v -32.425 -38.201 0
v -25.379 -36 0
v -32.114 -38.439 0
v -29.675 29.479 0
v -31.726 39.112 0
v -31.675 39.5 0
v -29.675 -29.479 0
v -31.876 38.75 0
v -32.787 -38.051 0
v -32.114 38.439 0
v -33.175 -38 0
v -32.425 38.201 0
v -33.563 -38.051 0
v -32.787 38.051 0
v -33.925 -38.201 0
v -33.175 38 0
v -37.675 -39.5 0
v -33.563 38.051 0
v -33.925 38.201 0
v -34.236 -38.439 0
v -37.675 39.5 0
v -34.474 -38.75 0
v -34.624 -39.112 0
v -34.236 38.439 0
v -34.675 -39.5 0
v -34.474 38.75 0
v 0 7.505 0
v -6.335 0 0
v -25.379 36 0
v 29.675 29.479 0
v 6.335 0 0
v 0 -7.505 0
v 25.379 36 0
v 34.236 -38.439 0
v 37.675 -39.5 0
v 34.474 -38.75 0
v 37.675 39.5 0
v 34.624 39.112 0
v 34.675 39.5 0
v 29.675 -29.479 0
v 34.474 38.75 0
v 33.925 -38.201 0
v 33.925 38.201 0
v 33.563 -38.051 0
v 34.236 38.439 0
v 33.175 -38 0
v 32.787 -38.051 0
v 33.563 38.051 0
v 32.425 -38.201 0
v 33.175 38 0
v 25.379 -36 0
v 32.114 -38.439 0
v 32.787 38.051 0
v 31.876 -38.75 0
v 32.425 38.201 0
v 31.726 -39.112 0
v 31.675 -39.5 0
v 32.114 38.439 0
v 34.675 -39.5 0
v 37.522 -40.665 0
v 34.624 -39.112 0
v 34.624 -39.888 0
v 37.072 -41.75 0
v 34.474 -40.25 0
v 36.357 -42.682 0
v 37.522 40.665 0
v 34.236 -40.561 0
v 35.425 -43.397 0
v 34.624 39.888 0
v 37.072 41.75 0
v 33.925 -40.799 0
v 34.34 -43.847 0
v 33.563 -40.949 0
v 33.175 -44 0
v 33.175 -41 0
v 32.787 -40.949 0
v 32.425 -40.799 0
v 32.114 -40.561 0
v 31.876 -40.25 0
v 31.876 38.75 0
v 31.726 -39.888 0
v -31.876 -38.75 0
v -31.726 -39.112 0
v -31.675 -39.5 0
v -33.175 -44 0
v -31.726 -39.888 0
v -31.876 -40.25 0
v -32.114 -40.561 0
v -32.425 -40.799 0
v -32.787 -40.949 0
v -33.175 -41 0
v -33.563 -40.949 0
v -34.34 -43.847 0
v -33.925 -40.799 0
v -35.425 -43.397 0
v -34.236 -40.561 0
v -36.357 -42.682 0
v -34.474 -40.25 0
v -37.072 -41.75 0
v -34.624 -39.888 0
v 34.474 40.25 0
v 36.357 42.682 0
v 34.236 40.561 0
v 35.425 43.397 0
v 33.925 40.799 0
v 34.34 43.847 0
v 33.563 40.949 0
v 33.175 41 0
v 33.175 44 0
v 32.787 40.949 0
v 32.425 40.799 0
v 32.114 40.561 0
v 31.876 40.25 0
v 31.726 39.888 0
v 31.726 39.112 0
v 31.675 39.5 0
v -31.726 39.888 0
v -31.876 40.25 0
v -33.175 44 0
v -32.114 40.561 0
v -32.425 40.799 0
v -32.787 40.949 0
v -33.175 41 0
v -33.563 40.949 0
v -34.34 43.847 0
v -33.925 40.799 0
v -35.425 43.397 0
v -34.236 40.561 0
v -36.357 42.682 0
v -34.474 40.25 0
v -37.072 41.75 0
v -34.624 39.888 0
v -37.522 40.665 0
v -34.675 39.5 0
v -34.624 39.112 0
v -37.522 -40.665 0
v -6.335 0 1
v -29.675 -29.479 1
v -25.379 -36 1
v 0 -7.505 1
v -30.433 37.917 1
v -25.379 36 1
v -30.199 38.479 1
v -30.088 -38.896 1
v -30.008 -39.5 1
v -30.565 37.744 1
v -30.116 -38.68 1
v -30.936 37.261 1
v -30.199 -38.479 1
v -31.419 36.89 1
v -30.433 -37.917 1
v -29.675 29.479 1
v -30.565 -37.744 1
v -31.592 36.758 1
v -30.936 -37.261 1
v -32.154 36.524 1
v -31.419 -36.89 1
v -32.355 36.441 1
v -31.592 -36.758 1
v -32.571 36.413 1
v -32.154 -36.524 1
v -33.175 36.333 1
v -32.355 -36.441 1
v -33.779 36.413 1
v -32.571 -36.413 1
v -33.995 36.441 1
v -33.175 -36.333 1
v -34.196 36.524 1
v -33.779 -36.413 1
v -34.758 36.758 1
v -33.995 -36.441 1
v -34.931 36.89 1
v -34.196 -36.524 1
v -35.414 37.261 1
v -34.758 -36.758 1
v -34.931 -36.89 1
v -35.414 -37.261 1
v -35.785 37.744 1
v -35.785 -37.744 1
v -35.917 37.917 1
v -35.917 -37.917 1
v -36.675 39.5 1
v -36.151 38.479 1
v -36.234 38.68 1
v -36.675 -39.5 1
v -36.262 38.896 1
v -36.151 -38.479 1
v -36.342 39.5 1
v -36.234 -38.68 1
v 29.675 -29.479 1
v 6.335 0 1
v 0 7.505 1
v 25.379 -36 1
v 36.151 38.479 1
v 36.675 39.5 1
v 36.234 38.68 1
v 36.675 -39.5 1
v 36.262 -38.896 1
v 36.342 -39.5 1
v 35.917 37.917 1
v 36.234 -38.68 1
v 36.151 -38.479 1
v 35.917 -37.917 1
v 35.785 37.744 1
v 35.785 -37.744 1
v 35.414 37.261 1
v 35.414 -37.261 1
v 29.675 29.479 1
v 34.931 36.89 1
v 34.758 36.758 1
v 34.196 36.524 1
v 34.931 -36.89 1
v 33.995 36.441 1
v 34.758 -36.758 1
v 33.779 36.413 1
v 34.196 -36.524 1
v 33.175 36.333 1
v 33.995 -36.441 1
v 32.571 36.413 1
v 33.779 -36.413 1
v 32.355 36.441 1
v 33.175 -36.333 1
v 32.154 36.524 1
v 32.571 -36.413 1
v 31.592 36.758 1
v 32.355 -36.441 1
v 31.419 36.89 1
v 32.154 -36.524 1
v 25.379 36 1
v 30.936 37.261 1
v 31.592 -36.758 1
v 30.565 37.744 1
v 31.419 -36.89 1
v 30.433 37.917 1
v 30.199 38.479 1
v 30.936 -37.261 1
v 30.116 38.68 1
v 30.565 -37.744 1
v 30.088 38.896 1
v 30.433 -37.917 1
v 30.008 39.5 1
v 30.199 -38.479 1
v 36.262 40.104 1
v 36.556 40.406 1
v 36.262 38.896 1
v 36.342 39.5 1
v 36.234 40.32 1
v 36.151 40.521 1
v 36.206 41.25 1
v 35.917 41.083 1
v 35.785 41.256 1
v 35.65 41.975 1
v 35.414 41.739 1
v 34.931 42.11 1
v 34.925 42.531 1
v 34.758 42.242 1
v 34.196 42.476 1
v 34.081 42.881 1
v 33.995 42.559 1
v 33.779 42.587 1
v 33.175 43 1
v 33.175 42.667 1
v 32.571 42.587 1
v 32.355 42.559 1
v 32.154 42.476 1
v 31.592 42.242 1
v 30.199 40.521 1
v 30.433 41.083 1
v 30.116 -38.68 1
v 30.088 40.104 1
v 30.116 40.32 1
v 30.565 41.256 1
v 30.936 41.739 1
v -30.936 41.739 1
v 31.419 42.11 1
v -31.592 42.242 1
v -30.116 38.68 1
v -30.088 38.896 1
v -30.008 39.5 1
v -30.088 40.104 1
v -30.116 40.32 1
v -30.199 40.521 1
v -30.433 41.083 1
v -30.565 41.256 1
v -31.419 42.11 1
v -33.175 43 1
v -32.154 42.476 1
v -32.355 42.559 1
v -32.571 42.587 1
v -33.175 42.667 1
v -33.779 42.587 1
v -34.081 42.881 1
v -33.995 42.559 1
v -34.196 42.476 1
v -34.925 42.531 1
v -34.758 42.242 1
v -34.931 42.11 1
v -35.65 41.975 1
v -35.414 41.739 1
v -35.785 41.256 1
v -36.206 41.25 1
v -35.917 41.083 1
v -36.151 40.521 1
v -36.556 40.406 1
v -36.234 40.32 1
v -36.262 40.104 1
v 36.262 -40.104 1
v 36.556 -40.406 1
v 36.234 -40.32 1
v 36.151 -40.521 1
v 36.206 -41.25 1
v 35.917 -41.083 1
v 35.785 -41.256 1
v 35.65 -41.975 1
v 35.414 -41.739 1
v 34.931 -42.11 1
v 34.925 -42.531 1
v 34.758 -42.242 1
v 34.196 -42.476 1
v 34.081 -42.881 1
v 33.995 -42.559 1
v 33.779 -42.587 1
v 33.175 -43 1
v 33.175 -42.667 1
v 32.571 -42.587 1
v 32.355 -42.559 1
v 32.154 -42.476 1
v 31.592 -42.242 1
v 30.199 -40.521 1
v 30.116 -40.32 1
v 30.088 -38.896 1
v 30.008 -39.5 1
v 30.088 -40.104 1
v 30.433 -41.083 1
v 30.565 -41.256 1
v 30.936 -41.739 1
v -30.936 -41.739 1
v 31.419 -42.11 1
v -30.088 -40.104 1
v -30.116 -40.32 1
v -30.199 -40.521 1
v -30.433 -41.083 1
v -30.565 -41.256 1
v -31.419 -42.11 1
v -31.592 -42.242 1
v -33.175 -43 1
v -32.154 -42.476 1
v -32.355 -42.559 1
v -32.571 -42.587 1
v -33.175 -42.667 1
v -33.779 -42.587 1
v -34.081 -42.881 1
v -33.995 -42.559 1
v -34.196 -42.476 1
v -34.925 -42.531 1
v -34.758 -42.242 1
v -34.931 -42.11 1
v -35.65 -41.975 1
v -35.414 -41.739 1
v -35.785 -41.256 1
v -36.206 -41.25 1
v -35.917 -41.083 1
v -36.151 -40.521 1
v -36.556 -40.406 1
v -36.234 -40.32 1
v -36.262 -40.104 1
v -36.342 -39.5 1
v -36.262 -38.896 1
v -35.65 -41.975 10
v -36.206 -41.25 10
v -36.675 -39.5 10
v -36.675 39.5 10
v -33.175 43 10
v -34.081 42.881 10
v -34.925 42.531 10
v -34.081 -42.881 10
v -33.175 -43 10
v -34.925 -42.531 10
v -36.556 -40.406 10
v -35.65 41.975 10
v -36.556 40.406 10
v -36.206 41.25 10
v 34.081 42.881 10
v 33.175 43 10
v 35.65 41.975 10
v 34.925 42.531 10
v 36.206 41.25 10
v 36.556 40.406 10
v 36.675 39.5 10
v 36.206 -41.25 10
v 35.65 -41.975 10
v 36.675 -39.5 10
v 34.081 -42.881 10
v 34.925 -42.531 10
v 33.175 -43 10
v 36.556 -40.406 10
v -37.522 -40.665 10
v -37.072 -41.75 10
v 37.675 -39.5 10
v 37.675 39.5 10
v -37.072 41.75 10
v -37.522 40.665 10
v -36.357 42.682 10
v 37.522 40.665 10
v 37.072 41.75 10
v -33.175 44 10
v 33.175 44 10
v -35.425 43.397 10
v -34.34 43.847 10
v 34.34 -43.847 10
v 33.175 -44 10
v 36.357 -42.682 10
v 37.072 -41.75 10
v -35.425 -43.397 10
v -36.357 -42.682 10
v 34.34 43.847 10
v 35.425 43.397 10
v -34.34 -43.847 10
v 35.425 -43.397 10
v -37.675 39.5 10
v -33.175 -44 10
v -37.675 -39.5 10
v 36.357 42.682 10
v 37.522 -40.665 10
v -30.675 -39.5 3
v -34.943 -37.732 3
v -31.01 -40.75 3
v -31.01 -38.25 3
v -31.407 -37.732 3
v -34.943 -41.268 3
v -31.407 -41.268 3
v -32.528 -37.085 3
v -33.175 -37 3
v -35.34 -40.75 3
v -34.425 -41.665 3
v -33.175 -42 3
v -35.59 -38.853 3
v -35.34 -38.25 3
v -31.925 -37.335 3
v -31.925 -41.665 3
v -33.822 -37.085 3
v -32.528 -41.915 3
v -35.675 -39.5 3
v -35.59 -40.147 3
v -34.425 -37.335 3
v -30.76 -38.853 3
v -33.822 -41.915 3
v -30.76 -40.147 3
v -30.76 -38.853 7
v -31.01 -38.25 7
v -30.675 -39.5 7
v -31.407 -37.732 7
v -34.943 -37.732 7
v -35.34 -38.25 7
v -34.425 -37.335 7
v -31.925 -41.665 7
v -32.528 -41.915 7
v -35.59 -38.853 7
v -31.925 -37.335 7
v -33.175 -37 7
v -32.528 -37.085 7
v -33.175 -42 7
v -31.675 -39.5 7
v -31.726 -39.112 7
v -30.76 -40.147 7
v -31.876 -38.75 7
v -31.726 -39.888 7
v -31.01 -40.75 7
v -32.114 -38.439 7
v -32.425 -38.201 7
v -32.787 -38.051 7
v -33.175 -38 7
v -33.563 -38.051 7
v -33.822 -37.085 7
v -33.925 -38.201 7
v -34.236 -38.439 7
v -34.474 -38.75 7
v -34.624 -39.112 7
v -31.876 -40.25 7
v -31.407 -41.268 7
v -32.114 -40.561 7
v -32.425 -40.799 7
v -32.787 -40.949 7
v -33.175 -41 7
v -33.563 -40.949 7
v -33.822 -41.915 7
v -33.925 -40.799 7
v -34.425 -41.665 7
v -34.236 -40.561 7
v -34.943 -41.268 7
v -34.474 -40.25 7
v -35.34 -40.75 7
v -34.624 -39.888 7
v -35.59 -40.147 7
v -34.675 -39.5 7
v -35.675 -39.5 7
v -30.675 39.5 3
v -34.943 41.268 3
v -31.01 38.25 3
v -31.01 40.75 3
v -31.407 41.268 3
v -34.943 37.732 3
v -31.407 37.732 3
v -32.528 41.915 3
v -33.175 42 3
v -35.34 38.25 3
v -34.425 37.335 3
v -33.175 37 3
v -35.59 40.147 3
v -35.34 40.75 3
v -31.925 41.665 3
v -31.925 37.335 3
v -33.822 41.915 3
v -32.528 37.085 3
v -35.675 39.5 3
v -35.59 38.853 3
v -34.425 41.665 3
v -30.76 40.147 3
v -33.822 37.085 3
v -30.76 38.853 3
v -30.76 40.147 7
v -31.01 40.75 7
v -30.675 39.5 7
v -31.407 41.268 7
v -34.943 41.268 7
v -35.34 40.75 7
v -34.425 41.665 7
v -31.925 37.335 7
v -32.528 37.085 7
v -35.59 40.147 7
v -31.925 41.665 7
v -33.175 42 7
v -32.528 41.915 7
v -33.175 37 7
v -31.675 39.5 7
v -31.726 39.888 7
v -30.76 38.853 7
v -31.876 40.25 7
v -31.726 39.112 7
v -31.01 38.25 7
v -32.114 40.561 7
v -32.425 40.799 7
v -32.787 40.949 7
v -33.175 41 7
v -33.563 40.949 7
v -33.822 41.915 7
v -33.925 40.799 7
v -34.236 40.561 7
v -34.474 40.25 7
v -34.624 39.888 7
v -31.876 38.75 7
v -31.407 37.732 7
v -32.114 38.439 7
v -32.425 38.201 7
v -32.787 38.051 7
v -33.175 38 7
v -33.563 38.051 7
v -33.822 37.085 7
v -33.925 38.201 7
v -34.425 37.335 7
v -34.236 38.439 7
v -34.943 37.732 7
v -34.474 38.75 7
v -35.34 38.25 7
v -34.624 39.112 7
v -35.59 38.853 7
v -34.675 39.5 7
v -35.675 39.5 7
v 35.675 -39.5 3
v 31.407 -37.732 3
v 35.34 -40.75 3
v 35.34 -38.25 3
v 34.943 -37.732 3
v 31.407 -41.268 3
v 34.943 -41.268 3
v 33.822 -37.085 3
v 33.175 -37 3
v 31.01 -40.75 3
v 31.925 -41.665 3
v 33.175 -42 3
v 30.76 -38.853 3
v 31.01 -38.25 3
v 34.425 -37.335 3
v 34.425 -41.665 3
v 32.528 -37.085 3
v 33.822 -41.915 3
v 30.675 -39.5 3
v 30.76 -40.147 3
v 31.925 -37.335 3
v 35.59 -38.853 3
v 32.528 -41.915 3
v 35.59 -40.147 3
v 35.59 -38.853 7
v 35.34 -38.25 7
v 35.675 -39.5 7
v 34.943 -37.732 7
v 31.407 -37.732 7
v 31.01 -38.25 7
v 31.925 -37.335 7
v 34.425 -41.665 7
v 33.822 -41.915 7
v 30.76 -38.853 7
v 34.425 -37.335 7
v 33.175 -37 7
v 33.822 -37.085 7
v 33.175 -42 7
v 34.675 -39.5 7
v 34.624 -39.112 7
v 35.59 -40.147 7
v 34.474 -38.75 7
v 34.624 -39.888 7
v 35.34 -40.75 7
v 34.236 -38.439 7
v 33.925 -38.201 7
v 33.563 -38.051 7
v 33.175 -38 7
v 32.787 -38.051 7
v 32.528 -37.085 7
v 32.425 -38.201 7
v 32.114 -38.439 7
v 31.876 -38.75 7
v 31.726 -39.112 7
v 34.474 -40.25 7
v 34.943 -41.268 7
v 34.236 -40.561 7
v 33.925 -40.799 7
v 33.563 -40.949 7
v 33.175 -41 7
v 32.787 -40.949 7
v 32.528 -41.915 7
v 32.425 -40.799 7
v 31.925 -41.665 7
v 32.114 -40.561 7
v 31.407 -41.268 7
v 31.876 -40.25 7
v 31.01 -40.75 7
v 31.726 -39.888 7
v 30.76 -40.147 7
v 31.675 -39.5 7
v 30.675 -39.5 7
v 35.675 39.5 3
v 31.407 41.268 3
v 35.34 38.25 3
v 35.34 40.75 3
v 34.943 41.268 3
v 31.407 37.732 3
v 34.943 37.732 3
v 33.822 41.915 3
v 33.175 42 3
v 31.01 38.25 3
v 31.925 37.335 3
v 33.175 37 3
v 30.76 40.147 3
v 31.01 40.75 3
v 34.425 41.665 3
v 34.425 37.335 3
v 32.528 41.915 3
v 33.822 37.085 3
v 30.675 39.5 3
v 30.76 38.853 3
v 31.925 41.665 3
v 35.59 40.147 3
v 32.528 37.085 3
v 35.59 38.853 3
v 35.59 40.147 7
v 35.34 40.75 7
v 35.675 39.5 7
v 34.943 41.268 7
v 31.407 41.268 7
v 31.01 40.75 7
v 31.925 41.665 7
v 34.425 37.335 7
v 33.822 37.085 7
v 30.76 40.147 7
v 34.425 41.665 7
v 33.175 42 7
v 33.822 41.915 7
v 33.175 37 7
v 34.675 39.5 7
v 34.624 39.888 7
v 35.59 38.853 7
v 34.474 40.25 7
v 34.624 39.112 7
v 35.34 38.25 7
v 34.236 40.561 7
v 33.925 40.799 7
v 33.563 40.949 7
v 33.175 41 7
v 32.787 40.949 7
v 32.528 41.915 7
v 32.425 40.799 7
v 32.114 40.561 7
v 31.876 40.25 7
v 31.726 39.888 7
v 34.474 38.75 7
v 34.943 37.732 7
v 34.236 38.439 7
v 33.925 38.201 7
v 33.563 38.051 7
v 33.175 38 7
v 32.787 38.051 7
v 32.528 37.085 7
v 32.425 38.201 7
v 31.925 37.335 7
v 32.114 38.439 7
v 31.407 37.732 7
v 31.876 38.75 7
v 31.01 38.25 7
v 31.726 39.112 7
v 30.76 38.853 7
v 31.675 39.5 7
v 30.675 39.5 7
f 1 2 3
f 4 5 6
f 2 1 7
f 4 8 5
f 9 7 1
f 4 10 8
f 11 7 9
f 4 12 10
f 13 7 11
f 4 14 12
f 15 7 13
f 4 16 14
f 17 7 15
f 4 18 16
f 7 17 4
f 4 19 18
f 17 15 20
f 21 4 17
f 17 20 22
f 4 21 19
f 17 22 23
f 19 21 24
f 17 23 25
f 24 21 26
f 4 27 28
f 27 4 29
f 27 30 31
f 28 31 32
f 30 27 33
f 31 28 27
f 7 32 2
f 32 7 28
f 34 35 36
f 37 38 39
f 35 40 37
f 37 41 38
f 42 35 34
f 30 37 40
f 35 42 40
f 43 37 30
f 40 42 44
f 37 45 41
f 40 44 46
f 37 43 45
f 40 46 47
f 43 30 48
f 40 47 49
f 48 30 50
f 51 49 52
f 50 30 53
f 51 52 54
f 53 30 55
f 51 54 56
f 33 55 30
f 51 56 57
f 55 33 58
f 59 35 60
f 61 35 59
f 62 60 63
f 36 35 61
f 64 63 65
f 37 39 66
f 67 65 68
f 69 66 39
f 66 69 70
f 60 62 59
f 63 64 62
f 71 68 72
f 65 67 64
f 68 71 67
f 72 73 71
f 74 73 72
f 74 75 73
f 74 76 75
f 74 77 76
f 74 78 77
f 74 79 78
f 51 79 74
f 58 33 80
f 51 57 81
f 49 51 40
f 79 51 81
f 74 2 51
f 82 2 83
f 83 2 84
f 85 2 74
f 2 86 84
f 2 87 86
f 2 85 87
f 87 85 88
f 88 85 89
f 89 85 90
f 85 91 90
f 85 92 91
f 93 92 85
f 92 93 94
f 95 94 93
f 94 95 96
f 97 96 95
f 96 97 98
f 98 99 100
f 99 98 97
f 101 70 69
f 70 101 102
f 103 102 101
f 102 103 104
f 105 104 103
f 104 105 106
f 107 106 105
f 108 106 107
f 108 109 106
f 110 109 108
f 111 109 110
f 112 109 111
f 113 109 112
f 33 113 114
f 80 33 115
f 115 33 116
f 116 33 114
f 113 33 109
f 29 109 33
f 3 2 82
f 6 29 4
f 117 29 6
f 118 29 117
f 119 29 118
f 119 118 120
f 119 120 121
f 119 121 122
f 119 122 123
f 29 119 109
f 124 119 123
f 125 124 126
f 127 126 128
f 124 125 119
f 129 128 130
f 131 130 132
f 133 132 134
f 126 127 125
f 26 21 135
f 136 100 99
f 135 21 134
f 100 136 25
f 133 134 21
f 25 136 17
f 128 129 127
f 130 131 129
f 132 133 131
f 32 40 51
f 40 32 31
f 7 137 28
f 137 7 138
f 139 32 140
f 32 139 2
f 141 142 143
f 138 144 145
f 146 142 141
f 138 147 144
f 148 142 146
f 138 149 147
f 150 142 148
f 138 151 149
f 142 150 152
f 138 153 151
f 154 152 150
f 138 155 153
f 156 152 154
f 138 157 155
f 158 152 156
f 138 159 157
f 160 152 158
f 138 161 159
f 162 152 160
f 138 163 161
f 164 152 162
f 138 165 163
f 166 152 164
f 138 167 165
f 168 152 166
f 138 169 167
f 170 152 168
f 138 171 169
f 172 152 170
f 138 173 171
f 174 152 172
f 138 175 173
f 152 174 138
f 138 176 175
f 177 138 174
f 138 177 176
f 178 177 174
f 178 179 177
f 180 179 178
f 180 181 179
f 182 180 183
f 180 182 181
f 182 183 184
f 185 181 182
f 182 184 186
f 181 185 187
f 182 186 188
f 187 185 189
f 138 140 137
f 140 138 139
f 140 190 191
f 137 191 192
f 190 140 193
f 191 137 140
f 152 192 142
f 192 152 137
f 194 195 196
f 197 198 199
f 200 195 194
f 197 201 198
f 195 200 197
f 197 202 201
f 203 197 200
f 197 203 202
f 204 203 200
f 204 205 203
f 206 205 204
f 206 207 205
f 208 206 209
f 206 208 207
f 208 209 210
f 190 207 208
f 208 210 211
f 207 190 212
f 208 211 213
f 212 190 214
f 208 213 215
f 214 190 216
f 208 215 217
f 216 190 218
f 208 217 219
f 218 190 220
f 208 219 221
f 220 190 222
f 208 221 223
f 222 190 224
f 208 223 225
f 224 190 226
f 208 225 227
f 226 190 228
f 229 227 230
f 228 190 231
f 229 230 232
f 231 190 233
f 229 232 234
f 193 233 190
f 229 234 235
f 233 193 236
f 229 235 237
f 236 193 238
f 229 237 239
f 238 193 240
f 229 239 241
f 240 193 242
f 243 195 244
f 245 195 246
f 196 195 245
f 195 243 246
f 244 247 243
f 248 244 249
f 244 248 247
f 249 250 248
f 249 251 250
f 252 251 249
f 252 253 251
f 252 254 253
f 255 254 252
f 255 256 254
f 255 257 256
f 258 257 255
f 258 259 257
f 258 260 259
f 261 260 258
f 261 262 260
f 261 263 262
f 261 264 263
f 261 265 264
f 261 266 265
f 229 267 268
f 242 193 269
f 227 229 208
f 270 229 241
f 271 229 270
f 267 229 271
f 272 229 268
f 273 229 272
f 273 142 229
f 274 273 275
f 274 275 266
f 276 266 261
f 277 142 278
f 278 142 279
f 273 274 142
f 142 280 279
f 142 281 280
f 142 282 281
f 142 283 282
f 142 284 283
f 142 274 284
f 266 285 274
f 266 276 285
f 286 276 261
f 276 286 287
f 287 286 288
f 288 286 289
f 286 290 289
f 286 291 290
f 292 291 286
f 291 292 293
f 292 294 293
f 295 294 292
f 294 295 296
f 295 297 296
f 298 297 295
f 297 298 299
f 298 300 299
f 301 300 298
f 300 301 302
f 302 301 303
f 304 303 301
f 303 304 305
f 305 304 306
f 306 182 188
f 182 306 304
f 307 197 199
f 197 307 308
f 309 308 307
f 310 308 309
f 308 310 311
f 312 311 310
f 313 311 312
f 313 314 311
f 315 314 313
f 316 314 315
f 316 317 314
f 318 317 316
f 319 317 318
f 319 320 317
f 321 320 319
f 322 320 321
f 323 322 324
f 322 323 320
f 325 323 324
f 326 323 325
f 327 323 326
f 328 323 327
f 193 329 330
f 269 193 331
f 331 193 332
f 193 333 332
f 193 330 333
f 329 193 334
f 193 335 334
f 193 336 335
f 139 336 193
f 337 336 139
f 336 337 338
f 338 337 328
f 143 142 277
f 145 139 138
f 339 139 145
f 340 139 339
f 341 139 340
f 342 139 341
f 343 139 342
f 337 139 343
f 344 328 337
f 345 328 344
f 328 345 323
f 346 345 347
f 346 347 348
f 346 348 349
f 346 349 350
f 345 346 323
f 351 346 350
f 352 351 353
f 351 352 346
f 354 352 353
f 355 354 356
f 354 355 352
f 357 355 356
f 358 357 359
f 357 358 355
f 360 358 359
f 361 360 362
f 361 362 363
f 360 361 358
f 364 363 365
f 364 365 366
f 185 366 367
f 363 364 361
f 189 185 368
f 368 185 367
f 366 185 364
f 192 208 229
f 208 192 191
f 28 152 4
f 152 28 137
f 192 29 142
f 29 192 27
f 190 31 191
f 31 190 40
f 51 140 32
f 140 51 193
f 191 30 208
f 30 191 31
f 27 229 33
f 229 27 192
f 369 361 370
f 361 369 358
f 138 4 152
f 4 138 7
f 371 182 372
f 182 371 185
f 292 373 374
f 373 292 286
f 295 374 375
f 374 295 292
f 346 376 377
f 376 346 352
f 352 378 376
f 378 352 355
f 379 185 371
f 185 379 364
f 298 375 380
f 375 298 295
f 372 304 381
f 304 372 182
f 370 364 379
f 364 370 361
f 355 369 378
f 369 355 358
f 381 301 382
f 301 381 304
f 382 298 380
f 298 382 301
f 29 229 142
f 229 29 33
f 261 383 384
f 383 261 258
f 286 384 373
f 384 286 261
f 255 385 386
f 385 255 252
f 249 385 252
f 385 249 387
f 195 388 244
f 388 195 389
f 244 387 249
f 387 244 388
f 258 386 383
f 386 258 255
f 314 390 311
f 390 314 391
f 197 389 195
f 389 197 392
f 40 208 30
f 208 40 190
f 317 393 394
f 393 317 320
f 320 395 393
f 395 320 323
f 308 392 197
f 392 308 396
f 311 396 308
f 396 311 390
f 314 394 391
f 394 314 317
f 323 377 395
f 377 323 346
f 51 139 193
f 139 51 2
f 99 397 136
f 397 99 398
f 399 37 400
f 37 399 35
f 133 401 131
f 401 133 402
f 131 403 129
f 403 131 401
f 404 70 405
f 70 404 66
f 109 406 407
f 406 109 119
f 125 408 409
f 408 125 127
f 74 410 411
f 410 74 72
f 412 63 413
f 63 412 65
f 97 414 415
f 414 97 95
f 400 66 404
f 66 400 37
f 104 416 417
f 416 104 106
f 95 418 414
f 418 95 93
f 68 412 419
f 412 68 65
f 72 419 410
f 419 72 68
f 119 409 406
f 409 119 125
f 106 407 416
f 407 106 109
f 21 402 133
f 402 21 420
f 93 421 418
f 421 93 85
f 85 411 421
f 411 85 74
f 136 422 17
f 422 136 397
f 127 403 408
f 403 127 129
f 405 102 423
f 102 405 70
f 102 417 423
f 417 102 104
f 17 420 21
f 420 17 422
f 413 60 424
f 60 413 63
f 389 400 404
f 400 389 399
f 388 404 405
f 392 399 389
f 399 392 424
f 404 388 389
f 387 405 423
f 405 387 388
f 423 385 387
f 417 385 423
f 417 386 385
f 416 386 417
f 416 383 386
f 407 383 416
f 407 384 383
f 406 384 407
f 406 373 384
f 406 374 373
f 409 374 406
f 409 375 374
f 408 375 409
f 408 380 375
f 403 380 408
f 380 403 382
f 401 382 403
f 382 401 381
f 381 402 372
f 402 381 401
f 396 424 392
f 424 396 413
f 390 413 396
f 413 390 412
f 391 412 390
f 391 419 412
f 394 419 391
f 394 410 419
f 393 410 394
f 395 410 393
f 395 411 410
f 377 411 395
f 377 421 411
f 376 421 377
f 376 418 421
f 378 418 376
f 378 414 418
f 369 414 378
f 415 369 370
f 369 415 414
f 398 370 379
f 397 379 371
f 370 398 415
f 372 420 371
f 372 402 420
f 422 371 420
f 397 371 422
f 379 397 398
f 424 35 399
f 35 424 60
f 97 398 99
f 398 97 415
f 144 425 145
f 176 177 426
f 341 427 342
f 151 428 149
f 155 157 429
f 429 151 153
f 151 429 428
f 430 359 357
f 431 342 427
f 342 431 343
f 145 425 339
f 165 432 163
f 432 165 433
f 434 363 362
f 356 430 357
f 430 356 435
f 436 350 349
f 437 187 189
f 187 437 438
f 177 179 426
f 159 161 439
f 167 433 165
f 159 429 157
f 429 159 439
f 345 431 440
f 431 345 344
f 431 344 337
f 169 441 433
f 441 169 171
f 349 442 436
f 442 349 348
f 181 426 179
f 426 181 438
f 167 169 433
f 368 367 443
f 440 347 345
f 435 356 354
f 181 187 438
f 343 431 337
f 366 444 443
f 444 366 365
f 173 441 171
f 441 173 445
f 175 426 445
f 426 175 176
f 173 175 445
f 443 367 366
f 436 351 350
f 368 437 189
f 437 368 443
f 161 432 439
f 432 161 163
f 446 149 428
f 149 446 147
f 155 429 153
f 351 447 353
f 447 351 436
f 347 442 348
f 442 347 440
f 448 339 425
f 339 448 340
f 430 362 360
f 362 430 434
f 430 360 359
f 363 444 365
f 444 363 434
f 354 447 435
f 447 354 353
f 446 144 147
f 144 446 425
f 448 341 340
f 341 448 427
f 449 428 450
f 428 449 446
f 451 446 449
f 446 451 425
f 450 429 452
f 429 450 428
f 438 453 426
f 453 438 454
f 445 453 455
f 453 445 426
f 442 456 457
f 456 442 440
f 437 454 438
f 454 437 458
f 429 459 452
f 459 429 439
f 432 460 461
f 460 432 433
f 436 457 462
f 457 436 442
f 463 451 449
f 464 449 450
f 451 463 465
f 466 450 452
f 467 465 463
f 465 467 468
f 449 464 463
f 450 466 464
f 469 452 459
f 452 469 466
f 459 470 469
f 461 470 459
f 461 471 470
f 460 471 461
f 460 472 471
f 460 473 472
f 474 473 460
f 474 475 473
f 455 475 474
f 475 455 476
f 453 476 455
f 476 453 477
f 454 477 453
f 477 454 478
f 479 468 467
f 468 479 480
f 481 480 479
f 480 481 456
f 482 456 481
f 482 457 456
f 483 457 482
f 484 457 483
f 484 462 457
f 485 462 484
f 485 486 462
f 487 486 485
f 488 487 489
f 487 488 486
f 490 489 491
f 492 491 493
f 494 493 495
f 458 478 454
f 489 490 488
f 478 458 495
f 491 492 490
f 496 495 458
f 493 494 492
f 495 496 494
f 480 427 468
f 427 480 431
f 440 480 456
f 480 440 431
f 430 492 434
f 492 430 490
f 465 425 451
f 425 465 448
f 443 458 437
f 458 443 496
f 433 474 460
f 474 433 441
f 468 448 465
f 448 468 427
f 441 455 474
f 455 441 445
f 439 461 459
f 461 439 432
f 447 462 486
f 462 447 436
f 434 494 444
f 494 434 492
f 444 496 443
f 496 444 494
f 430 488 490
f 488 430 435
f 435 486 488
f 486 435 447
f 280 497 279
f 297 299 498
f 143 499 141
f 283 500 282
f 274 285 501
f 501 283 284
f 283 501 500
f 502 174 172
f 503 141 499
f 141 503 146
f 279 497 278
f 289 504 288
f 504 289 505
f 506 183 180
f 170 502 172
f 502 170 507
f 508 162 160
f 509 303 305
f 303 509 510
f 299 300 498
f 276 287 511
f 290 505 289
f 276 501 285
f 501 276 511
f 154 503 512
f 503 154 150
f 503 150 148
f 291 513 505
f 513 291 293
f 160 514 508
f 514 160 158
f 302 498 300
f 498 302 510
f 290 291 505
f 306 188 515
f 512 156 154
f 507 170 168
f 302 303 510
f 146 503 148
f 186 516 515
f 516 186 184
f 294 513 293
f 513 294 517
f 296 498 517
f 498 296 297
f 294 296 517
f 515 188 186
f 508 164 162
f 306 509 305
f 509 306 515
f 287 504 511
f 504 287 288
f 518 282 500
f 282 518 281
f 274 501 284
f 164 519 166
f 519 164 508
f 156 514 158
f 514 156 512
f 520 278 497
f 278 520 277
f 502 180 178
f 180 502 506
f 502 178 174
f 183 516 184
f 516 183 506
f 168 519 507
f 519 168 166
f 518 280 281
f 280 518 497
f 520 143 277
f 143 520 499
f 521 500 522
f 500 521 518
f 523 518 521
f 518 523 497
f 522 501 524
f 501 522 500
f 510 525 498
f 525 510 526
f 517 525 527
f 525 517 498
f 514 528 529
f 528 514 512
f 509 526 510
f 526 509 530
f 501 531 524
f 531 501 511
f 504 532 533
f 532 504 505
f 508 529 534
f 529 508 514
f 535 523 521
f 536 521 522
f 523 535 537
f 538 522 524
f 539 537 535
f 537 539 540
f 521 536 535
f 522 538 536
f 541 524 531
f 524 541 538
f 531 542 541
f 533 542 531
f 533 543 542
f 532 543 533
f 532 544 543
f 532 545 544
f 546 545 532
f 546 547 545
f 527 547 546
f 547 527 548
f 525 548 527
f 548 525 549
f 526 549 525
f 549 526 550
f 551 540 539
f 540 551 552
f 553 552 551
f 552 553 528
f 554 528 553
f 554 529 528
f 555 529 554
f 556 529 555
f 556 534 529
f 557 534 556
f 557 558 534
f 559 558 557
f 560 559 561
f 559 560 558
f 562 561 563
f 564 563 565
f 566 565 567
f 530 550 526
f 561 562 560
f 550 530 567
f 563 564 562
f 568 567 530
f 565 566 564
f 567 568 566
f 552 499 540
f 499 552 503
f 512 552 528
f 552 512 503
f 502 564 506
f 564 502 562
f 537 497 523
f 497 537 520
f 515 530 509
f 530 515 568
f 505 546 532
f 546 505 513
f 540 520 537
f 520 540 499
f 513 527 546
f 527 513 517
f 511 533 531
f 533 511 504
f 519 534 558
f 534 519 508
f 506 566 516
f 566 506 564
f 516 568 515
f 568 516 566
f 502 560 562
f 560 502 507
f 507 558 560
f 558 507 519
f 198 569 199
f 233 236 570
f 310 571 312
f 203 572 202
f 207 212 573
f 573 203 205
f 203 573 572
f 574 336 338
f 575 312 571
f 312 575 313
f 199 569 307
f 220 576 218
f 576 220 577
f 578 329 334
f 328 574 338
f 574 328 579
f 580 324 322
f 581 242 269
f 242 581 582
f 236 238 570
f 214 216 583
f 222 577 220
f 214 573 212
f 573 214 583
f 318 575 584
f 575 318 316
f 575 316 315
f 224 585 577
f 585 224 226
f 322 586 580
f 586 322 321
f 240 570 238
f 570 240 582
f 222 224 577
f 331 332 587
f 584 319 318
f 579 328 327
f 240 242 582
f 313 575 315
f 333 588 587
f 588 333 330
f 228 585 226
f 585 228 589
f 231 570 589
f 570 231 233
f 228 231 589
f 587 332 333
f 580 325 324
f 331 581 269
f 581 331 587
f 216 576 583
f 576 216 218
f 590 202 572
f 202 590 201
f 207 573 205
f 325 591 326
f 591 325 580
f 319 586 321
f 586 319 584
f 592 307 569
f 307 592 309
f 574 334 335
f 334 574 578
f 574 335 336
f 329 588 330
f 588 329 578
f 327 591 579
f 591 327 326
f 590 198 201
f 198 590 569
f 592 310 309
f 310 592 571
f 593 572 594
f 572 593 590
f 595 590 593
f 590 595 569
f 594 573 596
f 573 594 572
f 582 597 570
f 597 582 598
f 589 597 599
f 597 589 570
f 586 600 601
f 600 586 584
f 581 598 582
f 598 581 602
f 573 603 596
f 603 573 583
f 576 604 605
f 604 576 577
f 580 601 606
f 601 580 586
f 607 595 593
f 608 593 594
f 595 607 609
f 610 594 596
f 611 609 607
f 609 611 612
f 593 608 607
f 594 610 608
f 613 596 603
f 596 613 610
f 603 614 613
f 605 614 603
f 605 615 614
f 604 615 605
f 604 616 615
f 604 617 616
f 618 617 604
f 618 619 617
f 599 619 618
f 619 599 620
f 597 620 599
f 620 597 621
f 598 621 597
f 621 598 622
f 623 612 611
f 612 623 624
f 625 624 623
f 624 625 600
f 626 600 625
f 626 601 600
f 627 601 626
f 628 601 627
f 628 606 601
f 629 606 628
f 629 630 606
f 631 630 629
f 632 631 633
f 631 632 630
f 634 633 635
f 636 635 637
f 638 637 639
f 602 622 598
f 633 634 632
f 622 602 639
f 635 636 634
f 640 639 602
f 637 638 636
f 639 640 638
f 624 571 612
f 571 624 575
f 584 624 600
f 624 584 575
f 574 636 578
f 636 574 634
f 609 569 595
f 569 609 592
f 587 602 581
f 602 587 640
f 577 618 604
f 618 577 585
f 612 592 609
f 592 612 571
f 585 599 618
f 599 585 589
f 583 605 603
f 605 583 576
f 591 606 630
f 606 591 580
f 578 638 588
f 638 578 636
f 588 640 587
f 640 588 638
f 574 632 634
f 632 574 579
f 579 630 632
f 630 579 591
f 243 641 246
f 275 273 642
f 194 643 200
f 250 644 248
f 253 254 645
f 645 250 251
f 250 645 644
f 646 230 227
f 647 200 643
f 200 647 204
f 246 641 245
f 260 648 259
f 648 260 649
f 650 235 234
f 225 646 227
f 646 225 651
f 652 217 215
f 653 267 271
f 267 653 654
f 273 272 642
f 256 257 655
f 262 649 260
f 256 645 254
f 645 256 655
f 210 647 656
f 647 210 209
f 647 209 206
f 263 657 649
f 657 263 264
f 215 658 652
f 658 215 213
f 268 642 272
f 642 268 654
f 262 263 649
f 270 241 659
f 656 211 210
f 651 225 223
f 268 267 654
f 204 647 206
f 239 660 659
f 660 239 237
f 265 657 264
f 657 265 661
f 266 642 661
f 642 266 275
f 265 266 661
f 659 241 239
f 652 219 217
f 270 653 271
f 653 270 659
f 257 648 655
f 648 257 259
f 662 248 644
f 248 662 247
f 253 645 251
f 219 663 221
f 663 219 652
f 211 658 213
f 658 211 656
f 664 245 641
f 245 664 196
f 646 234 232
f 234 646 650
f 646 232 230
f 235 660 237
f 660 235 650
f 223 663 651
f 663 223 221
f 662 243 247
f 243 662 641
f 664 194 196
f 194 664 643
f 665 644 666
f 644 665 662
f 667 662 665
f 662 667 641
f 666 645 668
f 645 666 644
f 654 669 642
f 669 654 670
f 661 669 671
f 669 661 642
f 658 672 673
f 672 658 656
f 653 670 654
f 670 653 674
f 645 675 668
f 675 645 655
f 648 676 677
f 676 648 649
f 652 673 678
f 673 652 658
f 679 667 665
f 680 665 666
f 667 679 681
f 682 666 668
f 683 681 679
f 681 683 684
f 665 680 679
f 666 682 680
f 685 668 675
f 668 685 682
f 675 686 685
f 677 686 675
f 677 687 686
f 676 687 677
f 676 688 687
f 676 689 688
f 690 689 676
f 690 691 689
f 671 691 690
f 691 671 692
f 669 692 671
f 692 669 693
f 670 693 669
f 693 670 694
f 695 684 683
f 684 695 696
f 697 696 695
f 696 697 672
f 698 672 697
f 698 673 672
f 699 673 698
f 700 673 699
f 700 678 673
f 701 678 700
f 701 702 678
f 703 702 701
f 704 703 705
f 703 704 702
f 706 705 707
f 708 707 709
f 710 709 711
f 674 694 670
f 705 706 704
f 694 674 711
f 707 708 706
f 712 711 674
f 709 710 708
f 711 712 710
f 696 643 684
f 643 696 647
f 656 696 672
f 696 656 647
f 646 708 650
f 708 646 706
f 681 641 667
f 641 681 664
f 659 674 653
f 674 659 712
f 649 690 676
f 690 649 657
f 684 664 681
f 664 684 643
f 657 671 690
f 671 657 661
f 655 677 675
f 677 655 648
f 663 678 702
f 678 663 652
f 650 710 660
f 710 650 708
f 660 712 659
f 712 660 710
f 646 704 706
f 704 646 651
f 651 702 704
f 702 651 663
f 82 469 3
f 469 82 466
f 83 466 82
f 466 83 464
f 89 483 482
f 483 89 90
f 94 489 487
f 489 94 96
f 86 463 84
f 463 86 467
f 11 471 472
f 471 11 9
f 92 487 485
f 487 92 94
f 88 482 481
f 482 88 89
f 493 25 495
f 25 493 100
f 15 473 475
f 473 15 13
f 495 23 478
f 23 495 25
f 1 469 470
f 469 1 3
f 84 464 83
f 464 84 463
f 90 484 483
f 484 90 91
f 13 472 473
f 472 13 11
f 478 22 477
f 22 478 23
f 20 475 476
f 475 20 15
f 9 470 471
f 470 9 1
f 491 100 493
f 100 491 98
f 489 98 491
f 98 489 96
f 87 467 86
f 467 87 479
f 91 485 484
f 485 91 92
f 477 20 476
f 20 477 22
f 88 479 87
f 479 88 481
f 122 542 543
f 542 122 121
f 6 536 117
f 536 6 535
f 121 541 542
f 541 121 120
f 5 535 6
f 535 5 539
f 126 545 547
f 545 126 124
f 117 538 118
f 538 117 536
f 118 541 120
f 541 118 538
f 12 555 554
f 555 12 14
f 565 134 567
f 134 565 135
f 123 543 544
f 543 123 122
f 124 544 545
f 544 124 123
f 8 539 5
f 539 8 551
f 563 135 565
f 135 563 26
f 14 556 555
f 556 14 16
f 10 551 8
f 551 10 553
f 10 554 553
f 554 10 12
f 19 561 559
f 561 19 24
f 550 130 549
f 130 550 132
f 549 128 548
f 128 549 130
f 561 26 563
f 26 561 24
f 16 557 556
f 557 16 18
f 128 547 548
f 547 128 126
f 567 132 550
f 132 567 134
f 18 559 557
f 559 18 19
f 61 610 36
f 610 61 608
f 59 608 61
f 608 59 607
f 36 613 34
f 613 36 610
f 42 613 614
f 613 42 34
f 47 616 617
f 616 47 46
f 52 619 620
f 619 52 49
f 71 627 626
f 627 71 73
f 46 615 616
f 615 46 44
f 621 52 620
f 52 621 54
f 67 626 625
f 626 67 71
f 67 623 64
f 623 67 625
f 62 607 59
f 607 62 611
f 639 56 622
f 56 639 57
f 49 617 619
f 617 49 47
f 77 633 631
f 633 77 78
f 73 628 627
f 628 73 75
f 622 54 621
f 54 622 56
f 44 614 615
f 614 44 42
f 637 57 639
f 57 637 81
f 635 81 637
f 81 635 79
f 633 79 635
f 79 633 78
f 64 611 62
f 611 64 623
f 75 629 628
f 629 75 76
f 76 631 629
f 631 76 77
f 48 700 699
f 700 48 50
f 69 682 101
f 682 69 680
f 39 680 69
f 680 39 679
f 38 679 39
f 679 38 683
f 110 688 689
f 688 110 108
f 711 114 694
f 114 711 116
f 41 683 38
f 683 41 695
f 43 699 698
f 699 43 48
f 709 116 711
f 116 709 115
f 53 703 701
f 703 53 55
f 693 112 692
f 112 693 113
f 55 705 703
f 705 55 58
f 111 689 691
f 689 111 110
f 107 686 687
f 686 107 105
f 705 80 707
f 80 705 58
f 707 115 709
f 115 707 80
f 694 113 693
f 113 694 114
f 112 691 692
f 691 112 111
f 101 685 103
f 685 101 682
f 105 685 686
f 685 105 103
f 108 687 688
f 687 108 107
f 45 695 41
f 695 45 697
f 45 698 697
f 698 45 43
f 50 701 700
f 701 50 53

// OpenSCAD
// file: hull.scad
module multiHull(){
	for (i = [1 : $children-1])
		hull(){
			children(0);
			children(i);
		}
}

module sequentialHull(){
	for (i = [0: $children-2])
		hull(){
			children(i);
			children(i+1);
		}
}

/* Extended fun hull functions */ 

module cylinders(points, diameter, thickness){
	for (p=points){
		translate(p) cylinder(d=diameter, h=thickness, center=true);
	}
}

module plate(points, diameter, thickness, hole_diameter){
	difference(){
		hull() cylinders(points, diameter, thickness);
		cylinders(points, hole_diameter, 1000);
	}
}

module bar(length, width, thickness, hole_diameter){
	plate([[0,0,0], [length,0,0]], width, thickness, hole_diameter);
}

module rounded_box(points, radius, height){
	hull(){
		for (p = points){
			translate(p)
				cylinder(r=radius, h=height);
		}
	}
}

module point_cloud(points, radius=1, facets=8){
	for (p=points){
		translate(p)
			sphere(radius/cos(180/facets), $fn=facets);
		// polygon sphere circumscribed on radius
	}
}

module point_hull(points, radius=1, facets=8){
	hull(){
		point_cloud(points, radius, facets);
	}
}

// Shrink the exterior of the points so that the hull fits inside
function select(vector, i) = [ for (p=vector) p[i] ];
function axis_center(v, i) = (max(select(v, i)) - min(select(v,i)))/2;
function center(v) = [ for (i = [0,1,2]) axis_center(v, i) ];
function shrink_point(point, center, radius) = [ for (i = [0,1,2]) point[i] > center[i] ? point[i] - radius : point[i] + radius ]; 
function shrink(points, radius) = [ for (p = points) shrink_point(p, center(points), radius) ];

module interior_point_hull(points, radius=1){
	point_hull(shrink(points, radius), radius);
}

module interior_rounded_box(points, radius, height){
	rounded_box(shrink(points, radius), radius, height);
}


module mirror_copy(v = [1, 0, 0]) {
    children();
    mirror(v) children();
}
// main file
use <hull.scad>

w = 66.35;
l = 79;
pin_locations = [ [-w/2, -l/2, 0], [-w/2, l/2, 0], 
							    [ w/2, -l/2, 0], [ w/2, l/2, 0] ];

thickness = 1;
$fn = 24;

module place(i){
	translate(pin_locations[i])
		children(0);
}

module foot(){
	cylinder(d=7, h=thickness);
}

module standoff(){
	cylinder(d1=7, d2=5, h=3);
	cylinder(d=5, h=7);
}

module cross_bottom(){
	multiHull(){
		cylinder(d=10, h=thickness);
		place(0) foot();
		place(1) foot();
		place(2) foot();
		place(3) foot();
	}
}

module ring_bottom(){
	sequentialHull(){
		place(0) foot();
		place(1) foot();
		place(3) foot();
		place(2) foot();
		place(0) foot();
	}
}

module bumper(){
	difference(){
		rounded_box(pin_locations, radius=9/2, height=10);
		translate([0,0,-1])
			rounded_box(pin_locations, radius=7/2, height=12);
	}
}

module PCB_case(){
	difference(){ 
		// frame
		union(){
			 cross_bottom();
			 ring_bottom();
			 bumper();
			 for (i=[0:3]){
				place(i) standoff();
			}
		}
		// difference screw holes
		for (i=[0:3]){
			place(i) cylinder(d=3, h=100, center=true);
		}
	}
}

PCB_case();
